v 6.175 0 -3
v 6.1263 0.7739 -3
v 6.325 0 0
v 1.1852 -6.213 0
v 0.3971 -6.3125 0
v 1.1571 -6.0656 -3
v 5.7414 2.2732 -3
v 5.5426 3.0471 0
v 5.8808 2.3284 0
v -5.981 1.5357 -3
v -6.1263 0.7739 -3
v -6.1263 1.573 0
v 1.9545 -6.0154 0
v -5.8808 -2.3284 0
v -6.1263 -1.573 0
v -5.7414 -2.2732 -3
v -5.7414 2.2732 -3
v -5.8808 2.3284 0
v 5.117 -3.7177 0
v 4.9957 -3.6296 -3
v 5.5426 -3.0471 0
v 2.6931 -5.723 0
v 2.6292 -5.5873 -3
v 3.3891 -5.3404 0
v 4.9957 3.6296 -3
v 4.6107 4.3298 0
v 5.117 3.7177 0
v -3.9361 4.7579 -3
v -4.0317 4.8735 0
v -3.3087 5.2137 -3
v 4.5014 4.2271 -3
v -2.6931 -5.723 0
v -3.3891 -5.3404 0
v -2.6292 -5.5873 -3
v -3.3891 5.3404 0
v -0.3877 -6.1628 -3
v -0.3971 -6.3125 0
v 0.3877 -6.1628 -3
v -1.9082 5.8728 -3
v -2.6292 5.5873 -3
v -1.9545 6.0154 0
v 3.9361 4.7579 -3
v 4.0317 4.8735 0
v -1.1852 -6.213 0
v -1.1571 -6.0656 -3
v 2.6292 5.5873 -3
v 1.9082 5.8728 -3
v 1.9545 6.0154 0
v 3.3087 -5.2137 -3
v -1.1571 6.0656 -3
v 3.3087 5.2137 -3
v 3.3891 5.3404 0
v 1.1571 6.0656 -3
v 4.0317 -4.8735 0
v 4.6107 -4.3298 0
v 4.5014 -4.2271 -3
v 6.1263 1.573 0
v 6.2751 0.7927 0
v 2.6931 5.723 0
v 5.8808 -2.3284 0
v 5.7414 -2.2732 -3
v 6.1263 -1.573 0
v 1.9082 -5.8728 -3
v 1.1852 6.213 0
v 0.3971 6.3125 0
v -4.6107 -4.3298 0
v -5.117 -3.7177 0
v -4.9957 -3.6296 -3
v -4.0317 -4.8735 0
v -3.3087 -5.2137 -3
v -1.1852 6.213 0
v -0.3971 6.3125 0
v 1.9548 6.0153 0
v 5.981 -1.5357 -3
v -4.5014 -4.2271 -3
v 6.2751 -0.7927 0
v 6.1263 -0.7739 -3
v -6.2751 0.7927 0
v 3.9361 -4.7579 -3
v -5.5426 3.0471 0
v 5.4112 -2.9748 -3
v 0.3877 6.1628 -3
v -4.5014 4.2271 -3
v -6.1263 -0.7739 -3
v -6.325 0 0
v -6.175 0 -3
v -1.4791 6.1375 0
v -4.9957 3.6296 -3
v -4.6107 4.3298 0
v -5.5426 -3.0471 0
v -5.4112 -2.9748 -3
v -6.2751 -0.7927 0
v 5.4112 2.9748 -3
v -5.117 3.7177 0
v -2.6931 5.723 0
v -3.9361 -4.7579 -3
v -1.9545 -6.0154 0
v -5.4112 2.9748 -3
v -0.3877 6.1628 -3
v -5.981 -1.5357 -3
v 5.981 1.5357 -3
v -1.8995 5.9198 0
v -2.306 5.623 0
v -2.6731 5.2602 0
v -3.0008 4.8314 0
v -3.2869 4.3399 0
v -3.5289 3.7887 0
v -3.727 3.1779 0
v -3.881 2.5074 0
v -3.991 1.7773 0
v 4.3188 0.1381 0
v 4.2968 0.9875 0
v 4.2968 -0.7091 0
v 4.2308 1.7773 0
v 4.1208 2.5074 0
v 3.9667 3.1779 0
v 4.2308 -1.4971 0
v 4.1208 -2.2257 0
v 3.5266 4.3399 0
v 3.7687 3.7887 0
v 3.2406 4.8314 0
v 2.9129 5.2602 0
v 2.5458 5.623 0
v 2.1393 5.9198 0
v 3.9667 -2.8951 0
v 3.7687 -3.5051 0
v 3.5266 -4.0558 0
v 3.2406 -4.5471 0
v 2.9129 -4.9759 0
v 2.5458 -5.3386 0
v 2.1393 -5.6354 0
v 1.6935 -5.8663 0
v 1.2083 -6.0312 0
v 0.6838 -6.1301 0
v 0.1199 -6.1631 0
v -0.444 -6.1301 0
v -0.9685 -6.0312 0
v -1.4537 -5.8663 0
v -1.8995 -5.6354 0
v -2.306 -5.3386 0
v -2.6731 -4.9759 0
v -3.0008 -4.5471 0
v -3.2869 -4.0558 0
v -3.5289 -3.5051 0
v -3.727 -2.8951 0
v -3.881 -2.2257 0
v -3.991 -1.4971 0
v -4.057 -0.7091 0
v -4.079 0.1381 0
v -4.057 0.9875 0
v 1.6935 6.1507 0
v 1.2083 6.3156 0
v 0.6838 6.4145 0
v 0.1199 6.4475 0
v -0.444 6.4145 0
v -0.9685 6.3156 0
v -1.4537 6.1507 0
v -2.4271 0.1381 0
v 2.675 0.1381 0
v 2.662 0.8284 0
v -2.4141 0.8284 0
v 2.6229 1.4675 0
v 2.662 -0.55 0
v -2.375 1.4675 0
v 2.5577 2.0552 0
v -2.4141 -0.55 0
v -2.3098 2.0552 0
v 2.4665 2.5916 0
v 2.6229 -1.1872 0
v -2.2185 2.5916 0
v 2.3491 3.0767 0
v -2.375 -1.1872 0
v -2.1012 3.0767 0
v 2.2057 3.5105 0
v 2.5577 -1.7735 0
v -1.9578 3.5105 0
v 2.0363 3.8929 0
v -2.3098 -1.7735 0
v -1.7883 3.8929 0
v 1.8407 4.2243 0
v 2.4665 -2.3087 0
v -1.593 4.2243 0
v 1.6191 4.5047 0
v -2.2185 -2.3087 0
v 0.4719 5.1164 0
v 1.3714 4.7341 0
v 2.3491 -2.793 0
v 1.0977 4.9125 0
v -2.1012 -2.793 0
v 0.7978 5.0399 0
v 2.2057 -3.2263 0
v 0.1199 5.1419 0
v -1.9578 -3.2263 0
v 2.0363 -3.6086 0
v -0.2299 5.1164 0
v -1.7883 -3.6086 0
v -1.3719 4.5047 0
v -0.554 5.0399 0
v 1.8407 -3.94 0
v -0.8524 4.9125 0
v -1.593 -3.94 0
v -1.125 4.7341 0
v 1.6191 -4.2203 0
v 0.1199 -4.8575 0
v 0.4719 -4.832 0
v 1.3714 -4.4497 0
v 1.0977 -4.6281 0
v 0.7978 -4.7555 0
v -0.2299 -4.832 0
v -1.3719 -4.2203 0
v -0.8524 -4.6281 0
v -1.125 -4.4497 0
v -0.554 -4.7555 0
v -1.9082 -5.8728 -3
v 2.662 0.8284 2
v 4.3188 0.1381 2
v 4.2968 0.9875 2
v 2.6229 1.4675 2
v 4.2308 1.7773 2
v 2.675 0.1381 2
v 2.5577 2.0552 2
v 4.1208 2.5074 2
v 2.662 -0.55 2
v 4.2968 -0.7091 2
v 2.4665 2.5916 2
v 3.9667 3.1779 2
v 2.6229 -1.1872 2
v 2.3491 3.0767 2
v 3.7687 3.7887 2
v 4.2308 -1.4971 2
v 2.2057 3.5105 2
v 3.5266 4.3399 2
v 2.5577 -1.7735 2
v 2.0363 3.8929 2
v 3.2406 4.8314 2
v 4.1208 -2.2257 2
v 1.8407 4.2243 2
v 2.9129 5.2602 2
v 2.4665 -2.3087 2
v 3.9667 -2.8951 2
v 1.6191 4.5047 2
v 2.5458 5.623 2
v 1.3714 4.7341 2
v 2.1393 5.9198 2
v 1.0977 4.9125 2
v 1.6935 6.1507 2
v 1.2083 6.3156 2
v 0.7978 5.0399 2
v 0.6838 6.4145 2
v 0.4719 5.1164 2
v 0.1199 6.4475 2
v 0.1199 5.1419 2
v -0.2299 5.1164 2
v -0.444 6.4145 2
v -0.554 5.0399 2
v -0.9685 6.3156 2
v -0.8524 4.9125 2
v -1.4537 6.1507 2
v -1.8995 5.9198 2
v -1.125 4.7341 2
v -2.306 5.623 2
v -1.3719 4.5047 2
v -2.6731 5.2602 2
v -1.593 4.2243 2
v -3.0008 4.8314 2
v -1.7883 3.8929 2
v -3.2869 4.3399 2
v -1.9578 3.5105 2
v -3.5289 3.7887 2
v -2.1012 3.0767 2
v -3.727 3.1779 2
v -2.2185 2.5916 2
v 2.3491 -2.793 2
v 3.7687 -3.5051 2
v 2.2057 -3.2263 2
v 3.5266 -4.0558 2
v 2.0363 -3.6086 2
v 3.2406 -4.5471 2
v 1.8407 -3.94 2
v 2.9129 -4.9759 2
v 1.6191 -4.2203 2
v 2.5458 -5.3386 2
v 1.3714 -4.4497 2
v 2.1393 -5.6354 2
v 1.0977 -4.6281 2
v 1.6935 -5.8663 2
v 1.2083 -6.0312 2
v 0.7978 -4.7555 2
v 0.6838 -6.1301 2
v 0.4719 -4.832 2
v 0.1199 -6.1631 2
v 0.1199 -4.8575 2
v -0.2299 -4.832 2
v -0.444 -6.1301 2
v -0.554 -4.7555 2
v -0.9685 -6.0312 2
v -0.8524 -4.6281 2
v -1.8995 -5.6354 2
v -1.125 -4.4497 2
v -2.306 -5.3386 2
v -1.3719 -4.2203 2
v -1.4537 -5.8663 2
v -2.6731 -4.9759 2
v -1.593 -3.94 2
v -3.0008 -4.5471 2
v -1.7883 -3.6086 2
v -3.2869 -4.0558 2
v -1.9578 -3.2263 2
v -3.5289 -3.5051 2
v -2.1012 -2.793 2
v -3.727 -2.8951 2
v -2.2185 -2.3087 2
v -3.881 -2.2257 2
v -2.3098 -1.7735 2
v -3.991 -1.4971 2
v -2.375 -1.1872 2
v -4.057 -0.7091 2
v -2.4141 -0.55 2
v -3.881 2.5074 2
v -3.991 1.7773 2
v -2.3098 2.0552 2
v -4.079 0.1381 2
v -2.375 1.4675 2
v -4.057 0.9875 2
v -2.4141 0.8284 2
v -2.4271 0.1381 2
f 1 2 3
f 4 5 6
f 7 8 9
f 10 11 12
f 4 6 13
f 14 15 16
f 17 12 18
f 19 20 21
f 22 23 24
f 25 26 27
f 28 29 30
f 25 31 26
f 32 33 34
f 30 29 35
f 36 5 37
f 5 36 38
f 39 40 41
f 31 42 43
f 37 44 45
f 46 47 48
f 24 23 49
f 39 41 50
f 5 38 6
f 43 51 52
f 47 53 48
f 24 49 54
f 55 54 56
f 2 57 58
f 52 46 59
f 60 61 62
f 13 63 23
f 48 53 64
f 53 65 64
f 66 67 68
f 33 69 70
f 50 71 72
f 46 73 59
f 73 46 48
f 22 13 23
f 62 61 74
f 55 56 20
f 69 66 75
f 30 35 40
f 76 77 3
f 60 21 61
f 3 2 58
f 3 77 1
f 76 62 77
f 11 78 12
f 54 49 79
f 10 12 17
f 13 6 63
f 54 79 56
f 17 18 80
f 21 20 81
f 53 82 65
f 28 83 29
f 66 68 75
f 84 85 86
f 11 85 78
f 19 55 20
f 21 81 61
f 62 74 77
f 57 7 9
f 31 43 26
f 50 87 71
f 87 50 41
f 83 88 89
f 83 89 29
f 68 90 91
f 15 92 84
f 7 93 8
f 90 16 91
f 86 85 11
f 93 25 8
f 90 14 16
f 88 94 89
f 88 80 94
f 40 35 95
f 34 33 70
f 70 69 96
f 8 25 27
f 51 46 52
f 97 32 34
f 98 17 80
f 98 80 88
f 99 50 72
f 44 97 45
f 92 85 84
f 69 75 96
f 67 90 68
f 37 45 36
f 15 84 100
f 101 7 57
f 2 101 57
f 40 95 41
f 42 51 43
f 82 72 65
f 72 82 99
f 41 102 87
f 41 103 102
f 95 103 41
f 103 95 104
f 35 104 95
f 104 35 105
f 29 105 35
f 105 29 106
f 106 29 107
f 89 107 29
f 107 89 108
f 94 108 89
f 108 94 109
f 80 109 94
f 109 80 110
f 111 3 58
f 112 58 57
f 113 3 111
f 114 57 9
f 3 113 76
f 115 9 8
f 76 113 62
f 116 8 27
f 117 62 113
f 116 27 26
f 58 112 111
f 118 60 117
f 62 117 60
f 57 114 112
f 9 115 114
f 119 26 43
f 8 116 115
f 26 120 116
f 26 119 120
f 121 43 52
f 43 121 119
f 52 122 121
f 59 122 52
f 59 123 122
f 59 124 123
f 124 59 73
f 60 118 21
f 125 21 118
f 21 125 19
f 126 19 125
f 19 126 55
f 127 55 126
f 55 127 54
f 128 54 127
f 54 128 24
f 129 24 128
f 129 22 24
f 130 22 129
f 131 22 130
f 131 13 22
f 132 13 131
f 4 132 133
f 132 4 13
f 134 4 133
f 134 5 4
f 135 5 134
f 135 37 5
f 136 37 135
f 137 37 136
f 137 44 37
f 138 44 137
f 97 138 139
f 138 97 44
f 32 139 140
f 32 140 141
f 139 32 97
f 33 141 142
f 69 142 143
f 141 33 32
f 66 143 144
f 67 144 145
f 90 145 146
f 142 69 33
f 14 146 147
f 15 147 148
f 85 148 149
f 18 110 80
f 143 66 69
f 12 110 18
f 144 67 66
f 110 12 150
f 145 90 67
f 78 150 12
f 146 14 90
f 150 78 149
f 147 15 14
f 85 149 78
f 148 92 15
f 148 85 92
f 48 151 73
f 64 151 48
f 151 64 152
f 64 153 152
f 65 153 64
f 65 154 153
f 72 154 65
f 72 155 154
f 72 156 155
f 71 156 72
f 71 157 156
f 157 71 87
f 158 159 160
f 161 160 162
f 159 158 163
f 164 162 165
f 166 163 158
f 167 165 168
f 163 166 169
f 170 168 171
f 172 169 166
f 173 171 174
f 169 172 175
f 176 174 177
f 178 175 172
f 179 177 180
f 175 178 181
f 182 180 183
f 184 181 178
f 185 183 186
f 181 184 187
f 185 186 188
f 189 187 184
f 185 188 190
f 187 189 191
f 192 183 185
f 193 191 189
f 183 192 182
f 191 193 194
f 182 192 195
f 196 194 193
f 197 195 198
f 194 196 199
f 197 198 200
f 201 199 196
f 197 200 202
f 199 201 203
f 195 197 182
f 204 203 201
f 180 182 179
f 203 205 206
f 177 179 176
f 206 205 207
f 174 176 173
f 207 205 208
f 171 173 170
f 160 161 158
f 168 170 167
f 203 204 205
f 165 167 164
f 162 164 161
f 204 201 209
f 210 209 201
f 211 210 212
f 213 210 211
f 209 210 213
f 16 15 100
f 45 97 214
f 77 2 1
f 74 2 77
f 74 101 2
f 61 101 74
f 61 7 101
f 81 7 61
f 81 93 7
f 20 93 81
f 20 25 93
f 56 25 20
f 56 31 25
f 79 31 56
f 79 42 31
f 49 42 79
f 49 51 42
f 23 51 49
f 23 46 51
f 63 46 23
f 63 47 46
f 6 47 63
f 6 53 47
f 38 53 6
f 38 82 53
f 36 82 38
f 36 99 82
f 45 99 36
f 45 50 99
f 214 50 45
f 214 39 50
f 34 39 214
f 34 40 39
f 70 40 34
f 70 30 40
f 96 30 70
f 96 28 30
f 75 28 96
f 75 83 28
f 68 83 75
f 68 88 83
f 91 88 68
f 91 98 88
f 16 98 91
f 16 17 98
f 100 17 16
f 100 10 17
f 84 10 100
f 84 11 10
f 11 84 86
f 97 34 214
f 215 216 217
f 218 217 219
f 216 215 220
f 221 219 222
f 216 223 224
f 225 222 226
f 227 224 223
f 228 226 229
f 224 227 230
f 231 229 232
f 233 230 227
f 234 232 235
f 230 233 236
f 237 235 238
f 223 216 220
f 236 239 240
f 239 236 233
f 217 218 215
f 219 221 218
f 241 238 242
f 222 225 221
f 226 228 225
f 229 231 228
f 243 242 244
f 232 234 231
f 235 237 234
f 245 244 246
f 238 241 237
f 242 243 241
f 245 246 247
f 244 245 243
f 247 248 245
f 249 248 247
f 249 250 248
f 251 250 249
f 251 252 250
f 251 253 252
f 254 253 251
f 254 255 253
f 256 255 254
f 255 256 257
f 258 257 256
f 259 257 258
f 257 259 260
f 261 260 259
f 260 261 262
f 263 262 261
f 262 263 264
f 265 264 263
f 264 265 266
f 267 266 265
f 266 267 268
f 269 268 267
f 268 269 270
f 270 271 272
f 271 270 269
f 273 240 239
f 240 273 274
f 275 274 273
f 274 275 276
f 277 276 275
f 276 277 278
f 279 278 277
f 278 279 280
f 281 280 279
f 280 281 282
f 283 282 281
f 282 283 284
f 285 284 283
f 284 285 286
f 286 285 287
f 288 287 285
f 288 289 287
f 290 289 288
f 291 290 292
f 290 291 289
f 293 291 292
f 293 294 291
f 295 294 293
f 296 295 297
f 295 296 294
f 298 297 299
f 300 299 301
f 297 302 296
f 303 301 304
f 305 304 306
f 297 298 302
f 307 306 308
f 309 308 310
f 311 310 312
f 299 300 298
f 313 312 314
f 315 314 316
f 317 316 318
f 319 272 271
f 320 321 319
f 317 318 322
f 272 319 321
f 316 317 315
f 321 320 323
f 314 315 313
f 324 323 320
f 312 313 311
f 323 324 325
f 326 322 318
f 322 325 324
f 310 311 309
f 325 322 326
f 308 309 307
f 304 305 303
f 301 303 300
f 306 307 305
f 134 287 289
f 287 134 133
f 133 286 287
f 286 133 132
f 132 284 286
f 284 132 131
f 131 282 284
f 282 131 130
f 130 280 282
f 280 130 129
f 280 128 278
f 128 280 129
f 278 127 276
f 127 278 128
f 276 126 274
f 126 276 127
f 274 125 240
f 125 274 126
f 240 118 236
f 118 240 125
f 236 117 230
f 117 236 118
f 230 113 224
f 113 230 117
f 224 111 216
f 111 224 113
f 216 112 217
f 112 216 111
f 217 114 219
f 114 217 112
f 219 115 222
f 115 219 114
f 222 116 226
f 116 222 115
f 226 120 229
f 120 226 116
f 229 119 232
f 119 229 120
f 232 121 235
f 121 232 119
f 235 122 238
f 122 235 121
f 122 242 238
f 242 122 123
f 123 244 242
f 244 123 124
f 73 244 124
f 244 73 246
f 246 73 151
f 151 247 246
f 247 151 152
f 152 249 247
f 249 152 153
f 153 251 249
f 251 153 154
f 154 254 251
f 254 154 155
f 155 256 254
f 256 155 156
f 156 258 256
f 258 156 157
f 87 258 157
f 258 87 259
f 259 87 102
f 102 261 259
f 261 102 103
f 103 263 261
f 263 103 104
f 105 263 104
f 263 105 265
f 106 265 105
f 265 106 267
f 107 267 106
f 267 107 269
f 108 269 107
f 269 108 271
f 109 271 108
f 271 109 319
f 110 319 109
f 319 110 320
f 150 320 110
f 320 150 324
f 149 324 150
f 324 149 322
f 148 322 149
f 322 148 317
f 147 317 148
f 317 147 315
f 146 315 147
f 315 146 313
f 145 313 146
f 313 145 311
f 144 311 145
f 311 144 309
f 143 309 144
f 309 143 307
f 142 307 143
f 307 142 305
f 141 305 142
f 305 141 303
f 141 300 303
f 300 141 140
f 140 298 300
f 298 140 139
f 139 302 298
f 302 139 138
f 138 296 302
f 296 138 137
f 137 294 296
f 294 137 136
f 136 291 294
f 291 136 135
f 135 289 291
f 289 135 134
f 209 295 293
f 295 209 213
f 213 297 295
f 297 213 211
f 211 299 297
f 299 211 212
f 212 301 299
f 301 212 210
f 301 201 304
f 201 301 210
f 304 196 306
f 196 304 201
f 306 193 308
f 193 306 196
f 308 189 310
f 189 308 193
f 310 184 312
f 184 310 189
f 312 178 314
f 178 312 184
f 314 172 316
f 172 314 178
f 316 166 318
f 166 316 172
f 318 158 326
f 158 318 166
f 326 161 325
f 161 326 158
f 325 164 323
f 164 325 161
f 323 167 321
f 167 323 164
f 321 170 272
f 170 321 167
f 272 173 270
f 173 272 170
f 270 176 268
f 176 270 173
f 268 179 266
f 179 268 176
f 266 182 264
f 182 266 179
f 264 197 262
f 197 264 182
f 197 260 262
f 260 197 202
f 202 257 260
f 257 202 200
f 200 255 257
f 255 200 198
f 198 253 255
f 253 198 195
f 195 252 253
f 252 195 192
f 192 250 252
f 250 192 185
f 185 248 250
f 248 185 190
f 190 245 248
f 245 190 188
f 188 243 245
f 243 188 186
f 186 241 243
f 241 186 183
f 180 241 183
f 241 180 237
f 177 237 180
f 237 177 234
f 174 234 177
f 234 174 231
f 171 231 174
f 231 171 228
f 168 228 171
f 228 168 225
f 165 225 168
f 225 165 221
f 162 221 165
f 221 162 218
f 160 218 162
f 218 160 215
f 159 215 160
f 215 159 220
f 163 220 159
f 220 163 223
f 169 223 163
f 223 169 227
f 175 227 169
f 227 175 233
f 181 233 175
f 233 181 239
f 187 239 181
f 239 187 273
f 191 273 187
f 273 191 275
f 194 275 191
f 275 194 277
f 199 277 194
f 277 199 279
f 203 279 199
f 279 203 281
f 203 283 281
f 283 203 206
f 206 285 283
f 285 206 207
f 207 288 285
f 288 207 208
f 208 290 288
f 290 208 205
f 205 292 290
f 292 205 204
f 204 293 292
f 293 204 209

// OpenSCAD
$fn = 50;

difference() {
	union() {
		translate(v = [0, 0, -3.0]) {
			cylinder(h = 3, r1 = 6.175, r2 = 6.325);
		}
		linear_extrude(height = 2) {
			text(font = "Impact", halign = "center", size = 12, text = "0", valign = "center");
		}
	}
	union();
}
